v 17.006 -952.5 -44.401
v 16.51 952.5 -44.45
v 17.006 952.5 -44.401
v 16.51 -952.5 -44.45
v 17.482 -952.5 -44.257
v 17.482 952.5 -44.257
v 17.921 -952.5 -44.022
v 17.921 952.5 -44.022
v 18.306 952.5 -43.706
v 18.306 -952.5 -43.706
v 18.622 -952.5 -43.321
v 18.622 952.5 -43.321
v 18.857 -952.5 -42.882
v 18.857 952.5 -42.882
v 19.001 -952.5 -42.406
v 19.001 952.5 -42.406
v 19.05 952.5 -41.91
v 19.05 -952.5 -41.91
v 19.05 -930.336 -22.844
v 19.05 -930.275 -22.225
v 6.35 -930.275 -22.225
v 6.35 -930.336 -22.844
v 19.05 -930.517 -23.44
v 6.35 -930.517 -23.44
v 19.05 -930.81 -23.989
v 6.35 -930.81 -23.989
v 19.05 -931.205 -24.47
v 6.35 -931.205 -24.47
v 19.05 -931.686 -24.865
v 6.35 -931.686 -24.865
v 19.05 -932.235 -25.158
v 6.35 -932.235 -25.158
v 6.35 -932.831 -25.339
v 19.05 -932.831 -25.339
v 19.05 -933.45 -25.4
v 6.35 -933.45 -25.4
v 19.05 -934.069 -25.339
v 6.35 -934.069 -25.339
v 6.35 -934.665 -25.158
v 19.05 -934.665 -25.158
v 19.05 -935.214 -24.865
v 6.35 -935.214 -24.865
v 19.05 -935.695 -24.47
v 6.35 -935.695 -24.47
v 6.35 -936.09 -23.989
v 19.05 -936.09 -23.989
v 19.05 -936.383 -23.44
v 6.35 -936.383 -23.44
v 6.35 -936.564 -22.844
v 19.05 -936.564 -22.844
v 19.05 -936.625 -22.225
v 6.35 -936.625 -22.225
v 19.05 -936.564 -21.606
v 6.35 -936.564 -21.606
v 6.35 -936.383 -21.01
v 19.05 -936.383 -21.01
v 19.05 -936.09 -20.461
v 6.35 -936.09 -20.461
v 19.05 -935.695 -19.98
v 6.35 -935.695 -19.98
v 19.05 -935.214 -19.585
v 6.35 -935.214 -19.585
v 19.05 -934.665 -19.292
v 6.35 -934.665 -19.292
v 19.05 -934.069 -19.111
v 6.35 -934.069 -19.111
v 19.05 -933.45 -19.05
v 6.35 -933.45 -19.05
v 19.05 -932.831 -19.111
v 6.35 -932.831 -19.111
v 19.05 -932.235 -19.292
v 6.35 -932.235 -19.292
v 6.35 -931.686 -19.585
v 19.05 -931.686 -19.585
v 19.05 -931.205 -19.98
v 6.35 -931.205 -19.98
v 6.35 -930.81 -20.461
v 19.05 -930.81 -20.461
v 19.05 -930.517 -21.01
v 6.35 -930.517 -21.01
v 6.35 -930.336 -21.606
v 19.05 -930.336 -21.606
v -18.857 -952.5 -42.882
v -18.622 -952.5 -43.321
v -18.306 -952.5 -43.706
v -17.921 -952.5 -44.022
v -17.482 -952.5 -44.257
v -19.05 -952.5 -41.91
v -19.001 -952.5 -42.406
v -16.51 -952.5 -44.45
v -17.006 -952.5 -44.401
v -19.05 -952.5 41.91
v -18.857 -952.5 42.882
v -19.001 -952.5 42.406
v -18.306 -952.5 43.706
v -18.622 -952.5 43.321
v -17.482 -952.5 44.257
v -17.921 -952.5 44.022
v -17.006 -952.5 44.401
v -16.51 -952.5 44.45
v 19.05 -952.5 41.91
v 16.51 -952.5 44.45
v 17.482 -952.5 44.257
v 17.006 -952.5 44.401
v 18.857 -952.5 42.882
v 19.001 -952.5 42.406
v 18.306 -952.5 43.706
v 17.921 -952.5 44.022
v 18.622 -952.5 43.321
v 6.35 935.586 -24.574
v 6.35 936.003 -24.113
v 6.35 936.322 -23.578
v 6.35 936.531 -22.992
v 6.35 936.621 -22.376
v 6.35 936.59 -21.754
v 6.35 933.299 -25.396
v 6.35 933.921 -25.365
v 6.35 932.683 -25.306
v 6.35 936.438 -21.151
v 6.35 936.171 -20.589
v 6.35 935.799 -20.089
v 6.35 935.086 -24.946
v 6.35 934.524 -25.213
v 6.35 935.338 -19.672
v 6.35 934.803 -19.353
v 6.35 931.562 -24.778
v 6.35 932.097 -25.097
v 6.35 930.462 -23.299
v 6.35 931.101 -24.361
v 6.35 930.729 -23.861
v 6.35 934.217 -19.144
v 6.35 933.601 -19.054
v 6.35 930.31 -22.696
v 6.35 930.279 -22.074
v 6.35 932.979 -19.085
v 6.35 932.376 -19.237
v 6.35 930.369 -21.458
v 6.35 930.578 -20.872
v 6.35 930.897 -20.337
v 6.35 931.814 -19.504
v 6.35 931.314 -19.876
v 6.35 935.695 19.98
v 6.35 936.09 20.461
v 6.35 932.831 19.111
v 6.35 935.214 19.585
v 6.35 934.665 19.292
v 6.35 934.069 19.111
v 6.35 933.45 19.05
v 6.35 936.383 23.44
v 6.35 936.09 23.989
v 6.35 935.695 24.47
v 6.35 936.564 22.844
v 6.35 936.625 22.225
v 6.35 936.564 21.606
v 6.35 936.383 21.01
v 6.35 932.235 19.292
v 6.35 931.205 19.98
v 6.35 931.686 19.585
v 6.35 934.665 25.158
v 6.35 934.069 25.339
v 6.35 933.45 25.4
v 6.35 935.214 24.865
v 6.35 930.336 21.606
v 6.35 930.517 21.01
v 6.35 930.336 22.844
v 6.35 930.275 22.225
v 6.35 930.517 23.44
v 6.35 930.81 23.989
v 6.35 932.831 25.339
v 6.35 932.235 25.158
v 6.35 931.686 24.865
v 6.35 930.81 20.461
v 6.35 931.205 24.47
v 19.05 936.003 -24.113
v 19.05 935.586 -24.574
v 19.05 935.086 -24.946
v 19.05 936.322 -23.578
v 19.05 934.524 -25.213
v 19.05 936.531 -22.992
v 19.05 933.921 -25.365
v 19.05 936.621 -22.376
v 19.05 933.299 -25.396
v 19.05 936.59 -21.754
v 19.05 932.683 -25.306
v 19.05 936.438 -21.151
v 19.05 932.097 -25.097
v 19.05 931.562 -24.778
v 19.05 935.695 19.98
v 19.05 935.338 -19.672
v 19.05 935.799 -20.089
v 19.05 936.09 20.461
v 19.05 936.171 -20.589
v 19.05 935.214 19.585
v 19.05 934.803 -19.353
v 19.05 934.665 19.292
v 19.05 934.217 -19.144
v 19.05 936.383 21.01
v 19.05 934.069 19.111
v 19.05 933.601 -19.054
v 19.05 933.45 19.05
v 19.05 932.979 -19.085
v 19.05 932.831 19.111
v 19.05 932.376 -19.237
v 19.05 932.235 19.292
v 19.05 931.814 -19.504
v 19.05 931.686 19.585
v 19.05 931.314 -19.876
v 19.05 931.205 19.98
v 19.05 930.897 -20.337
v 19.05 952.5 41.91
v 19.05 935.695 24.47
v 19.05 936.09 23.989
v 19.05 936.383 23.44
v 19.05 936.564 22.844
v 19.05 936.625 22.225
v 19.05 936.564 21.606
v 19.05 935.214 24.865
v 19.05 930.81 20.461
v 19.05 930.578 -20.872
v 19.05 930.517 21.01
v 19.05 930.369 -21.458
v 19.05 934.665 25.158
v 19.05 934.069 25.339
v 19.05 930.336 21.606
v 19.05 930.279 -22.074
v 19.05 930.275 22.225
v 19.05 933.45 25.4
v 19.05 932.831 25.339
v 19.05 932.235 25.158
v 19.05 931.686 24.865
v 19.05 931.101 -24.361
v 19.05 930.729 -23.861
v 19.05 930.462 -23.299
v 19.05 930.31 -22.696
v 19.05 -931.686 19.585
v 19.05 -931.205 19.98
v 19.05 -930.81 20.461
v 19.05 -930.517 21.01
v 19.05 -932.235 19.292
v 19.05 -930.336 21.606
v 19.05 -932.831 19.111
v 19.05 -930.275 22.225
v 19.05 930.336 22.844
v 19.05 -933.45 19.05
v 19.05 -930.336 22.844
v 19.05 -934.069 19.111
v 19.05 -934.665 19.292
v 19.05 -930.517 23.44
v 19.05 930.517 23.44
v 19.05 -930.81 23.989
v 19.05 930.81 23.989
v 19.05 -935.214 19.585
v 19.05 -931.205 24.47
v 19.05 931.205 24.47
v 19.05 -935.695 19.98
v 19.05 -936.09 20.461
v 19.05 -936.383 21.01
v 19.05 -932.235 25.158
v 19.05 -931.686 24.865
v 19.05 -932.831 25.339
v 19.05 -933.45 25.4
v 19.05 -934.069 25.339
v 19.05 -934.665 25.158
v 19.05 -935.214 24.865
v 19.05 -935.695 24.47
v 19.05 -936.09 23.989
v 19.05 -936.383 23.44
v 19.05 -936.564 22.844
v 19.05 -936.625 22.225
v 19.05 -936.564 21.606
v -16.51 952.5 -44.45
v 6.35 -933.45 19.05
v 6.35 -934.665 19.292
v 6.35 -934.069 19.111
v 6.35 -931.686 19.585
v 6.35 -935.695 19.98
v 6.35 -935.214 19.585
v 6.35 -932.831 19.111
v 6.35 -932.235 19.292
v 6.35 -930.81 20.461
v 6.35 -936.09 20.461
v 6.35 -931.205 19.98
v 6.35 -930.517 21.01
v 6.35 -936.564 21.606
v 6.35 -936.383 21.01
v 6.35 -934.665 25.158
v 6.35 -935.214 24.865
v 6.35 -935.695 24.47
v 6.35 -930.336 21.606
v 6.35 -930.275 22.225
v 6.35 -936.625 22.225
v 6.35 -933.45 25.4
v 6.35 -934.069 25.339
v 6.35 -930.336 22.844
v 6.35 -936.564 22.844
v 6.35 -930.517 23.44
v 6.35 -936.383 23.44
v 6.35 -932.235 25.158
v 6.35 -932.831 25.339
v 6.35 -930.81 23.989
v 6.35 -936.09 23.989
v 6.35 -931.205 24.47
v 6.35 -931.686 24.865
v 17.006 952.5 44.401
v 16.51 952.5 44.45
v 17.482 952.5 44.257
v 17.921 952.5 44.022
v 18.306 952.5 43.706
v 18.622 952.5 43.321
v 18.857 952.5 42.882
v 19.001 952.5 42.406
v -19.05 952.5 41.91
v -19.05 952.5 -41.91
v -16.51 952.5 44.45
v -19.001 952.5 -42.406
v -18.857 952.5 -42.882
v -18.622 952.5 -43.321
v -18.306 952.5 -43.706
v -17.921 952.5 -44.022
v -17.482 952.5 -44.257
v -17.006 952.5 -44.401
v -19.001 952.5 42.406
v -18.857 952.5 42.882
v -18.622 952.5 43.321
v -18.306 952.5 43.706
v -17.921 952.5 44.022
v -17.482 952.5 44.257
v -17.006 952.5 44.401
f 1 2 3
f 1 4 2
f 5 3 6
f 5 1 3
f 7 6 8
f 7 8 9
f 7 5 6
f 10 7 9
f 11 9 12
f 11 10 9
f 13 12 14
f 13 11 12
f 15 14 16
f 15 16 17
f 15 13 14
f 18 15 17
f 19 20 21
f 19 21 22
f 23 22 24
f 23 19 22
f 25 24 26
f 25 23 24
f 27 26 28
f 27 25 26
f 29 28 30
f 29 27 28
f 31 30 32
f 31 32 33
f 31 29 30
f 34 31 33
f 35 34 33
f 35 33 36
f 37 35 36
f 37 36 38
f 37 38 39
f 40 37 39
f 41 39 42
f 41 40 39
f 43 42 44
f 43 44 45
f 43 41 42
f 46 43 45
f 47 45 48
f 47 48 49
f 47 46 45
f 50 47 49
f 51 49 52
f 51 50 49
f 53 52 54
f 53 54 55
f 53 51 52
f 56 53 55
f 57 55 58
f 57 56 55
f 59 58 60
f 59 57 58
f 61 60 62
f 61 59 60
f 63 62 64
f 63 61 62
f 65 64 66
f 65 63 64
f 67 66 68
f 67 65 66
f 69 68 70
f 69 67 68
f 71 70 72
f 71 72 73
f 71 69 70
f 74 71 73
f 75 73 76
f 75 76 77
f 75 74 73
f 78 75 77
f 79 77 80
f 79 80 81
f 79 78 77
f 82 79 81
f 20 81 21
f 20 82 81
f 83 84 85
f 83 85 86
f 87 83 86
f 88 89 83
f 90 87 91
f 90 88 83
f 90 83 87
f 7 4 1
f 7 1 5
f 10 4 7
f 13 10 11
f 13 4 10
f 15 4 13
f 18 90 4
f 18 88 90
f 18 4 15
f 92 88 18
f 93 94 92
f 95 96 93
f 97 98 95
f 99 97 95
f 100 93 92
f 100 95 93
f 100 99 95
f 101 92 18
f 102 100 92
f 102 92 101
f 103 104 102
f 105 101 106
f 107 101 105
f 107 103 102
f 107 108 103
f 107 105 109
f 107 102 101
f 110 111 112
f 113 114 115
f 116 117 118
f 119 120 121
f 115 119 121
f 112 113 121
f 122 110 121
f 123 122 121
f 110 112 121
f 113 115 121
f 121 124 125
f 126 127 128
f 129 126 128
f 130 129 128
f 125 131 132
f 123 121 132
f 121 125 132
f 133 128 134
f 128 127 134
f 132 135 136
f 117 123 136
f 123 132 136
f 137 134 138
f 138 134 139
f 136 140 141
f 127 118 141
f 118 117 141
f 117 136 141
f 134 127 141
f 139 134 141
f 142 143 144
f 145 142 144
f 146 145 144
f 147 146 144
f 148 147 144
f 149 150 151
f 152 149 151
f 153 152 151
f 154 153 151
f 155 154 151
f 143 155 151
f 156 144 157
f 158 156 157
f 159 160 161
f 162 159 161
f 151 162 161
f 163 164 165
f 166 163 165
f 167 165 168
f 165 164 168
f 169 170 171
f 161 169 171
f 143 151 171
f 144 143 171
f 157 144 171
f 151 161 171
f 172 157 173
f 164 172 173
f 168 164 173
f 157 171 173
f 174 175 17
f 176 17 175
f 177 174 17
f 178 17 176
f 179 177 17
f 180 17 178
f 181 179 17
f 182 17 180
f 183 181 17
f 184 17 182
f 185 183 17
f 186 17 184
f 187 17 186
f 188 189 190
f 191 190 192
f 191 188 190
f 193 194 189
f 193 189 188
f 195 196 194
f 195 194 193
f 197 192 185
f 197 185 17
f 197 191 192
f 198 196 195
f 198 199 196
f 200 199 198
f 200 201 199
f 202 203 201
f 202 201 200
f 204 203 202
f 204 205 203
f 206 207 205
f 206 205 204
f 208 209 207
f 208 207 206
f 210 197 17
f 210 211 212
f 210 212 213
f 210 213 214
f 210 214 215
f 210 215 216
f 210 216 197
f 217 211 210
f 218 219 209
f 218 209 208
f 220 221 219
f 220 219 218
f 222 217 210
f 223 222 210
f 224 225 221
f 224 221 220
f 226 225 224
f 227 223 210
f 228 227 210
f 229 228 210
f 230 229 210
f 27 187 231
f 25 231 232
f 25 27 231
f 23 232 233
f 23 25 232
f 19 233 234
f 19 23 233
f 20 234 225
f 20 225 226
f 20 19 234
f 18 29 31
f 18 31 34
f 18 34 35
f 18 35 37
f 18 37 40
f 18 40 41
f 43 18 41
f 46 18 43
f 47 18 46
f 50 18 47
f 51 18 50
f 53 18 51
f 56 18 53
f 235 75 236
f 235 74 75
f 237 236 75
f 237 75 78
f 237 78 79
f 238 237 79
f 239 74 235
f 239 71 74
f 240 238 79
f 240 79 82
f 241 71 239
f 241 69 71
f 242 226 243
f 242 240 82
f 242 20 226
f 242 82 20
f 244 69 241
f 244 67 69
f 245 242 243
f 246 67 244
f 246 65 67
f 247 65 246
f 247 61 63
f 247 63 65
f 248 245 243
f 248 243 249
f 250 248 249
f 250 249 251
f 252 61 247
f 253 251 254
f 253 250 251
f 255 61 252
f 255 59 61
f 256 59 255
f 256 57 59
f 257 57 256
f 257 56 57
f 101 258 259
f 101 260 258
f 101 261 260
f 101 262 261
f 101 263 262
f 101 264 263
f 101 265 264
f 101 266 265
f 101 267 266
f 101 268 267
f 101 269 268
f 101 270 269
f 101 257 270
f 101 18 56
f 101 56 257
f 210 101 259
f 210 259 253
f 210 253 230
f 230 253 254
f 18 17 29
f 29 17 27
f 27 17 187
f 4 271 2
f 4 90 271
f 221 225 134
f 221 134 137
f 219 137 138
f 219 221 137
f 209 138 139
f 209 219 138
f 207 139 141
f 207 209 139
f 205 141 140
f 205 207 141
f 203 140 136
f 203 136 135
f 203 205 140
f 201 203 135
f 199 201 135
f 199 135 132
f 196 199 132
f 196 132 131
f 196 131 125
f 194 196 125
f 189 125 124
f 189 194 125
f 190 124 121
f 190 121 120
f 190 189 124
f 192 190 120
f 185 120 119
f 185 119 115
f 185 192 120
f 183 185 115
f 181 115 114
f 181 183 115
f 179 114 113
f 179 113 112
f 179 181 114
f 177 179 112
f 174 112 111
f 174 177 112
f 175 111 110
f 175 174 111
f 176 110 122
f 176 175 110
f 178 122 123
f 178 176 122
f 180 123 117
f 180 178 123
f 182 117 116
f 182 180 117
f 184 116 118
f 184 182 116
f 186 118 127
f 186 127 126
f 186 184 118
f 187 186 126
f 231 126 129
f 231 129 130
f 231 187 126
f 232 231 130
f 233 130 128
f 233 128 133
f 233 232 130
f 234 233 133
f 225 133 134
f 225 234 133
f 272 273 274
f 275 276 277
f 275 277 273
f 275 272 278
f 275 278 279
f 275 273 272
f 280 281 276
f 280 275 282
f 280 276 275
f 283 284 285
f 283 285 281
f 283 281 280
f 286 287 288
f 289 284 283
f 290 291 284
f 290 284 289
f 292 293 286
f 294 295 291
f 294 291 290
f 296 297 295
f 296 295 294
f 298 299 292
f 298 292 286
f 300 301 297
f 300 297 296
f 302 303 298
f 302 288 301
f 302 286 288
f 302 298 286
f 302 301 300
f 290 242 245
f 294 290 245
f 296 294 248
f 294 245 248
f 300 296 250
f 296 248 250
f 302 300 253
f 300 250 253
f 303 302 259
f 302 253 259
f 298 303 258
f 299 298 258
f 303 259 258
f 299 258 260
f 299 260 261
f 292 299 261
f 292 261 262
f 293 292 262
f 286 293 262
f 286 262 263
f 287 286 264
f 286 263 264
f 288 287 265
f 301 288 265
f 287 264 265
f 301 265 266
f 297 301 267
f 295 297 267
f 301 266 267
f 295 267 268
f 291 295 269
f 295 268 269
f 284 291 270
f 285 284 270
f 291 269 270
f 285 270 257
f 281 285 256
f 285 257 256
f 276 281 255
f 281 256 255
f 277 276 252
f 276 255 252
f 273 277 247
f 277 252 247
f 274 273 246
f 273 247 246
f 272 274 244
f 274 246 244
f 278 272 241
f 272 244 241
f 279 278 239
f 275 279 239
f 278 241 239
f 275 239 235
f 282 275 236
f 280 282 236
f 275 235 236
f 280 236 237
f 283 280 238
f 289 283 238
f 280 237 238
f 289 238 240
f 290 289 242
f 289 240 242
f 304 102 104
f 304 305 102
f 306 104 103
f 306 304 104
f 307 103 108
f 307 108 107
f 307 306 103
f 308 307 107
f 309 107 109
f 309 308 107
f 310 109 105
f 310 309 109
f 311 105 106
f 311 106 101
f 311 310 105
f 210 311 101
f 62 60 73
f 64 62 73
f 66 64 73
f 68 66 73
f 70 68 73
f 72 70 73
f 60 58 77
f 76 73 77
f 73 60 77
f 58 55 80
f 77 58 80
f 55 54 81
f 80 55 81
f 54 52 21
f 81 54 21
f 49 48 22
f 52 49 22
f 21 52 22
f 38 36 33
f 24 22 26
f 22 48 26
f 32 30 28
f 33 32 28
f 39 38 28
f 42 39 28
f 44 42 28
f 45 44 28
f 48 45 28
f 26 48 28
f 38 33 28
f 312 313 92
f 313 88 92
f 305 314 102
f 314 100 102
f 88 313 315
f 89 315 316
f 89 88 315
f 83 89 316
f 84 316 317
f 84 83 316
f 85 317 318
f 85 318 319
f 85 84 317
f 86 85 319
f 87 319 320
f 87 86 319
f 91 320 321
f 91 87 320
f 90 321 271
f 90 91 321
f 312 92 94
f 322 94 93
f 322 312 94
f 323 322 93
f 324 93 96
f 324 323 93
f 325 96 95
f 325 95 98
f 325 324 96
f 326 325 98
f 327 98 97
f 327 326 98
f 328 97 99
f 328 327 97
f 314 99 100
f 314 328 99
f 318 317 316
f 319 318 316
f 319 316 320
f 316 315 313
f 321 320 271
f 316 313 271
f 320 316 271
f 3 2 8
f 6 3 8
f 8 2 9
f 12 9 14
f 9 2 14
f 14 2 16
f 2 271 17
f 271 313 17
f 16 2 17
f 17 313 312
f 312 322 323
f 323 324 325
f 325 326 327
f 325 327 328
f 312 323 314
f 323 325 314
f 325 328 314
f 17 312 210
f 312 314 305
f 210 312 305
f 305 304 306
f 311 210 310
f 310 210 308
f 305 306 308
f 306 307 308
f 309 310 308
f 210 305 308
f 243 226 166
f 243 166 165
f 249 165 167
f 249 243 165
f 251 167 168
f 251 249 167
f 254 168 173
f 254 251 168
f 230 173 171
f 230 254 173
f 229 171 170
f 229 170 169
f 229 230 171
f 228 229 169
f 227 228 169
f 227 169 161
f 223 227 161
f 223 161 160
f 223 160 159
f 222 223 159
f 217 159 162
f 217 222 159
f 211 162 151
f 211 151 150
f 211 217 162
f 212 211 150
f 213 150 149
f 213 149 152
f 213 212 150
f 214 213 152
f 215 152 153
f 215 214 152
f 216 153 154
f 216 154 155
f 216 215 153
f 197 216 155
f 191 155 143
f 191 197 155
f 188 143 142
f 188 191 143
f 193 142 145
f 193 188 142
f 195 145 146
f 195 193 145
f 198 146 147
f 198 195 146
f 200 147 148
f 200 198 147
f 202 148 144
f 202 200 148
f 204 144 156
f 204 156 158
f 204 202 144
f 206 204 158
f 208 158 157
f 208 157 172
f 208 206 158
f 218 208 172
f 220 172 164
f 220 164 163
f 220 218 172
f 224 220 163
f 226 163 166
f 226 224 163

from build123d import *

# Parameters (mm, degrees)
F0_W          = 38.1
F0_H          = 88.9
F1_DEPTH      = 952.5
F1_DEPTH_BACK = 952.5
F2_R          = 3.175
F3_DEPTH      = 12.7
F4_R          = 2.54


# Not quite as in the source:
# - a length typed as a fraction of an inch, garbled in the dataset ("3 / 203.2 mm" for 3/8 in), is restored
# - a pattern or mirror of a feature is missing from the dataset's text; its kind, count and spacing are read off the source's solid


with BuildPart() as f1:
    # F0 (on Front) → F1 (new body, two sides)
    with BuildSketch(Plane.XZ) as f1_sk:
        Rectangle(F0_W, F0_H)
    extrude(amount=F1_DEPTH)
    extrude(f1_sk.sketch, amount=-F1_DEPTH_BACK)

    # F2 (on face) → F3 (cut)
    with BuildSketch(Plane.YZ.offset(19.05)):
        with Locations((-933.45, 22.225)):
            Circle(F2_R)
    f3 = extrude(amount=-F3_DEPTH, mode=Mode.SUBTRACT)

    # F3_copies: F3 across plane
    add(f3.mirror(Plane(origin=(0, 0, 0), x_dir=(0, 0.0238027779, 0.9997166737), z_dir=(0, 0.9997166737, -0.0238027779))), mode=Mode.SUBTRACT)

    # F3_copies1: F3 across plane
    add(f3.mirror(Plane(origin=(0, 0, 0), x_dir=(-1, 0, 0), z_dir=(0, 0, -1))), mode=Mode.SUBTRACT)

    # F3_copies2: F3 across plane
    add(f3.mirror(Plane.ZX), mode=Mode.SUBTRACT)

    # F4
    f4_edges = [f1.edges().sort_by_distance(p)[0] for p in [
        (19.05, 0, 44.45),
        (-19.05, 0, 44.45),
        (19.05, 0, -44.45),
        (-19.05, 0, -44.45),
    ]]
    fillet(f4_edges, radius=F4_R)


solid = f1.part
